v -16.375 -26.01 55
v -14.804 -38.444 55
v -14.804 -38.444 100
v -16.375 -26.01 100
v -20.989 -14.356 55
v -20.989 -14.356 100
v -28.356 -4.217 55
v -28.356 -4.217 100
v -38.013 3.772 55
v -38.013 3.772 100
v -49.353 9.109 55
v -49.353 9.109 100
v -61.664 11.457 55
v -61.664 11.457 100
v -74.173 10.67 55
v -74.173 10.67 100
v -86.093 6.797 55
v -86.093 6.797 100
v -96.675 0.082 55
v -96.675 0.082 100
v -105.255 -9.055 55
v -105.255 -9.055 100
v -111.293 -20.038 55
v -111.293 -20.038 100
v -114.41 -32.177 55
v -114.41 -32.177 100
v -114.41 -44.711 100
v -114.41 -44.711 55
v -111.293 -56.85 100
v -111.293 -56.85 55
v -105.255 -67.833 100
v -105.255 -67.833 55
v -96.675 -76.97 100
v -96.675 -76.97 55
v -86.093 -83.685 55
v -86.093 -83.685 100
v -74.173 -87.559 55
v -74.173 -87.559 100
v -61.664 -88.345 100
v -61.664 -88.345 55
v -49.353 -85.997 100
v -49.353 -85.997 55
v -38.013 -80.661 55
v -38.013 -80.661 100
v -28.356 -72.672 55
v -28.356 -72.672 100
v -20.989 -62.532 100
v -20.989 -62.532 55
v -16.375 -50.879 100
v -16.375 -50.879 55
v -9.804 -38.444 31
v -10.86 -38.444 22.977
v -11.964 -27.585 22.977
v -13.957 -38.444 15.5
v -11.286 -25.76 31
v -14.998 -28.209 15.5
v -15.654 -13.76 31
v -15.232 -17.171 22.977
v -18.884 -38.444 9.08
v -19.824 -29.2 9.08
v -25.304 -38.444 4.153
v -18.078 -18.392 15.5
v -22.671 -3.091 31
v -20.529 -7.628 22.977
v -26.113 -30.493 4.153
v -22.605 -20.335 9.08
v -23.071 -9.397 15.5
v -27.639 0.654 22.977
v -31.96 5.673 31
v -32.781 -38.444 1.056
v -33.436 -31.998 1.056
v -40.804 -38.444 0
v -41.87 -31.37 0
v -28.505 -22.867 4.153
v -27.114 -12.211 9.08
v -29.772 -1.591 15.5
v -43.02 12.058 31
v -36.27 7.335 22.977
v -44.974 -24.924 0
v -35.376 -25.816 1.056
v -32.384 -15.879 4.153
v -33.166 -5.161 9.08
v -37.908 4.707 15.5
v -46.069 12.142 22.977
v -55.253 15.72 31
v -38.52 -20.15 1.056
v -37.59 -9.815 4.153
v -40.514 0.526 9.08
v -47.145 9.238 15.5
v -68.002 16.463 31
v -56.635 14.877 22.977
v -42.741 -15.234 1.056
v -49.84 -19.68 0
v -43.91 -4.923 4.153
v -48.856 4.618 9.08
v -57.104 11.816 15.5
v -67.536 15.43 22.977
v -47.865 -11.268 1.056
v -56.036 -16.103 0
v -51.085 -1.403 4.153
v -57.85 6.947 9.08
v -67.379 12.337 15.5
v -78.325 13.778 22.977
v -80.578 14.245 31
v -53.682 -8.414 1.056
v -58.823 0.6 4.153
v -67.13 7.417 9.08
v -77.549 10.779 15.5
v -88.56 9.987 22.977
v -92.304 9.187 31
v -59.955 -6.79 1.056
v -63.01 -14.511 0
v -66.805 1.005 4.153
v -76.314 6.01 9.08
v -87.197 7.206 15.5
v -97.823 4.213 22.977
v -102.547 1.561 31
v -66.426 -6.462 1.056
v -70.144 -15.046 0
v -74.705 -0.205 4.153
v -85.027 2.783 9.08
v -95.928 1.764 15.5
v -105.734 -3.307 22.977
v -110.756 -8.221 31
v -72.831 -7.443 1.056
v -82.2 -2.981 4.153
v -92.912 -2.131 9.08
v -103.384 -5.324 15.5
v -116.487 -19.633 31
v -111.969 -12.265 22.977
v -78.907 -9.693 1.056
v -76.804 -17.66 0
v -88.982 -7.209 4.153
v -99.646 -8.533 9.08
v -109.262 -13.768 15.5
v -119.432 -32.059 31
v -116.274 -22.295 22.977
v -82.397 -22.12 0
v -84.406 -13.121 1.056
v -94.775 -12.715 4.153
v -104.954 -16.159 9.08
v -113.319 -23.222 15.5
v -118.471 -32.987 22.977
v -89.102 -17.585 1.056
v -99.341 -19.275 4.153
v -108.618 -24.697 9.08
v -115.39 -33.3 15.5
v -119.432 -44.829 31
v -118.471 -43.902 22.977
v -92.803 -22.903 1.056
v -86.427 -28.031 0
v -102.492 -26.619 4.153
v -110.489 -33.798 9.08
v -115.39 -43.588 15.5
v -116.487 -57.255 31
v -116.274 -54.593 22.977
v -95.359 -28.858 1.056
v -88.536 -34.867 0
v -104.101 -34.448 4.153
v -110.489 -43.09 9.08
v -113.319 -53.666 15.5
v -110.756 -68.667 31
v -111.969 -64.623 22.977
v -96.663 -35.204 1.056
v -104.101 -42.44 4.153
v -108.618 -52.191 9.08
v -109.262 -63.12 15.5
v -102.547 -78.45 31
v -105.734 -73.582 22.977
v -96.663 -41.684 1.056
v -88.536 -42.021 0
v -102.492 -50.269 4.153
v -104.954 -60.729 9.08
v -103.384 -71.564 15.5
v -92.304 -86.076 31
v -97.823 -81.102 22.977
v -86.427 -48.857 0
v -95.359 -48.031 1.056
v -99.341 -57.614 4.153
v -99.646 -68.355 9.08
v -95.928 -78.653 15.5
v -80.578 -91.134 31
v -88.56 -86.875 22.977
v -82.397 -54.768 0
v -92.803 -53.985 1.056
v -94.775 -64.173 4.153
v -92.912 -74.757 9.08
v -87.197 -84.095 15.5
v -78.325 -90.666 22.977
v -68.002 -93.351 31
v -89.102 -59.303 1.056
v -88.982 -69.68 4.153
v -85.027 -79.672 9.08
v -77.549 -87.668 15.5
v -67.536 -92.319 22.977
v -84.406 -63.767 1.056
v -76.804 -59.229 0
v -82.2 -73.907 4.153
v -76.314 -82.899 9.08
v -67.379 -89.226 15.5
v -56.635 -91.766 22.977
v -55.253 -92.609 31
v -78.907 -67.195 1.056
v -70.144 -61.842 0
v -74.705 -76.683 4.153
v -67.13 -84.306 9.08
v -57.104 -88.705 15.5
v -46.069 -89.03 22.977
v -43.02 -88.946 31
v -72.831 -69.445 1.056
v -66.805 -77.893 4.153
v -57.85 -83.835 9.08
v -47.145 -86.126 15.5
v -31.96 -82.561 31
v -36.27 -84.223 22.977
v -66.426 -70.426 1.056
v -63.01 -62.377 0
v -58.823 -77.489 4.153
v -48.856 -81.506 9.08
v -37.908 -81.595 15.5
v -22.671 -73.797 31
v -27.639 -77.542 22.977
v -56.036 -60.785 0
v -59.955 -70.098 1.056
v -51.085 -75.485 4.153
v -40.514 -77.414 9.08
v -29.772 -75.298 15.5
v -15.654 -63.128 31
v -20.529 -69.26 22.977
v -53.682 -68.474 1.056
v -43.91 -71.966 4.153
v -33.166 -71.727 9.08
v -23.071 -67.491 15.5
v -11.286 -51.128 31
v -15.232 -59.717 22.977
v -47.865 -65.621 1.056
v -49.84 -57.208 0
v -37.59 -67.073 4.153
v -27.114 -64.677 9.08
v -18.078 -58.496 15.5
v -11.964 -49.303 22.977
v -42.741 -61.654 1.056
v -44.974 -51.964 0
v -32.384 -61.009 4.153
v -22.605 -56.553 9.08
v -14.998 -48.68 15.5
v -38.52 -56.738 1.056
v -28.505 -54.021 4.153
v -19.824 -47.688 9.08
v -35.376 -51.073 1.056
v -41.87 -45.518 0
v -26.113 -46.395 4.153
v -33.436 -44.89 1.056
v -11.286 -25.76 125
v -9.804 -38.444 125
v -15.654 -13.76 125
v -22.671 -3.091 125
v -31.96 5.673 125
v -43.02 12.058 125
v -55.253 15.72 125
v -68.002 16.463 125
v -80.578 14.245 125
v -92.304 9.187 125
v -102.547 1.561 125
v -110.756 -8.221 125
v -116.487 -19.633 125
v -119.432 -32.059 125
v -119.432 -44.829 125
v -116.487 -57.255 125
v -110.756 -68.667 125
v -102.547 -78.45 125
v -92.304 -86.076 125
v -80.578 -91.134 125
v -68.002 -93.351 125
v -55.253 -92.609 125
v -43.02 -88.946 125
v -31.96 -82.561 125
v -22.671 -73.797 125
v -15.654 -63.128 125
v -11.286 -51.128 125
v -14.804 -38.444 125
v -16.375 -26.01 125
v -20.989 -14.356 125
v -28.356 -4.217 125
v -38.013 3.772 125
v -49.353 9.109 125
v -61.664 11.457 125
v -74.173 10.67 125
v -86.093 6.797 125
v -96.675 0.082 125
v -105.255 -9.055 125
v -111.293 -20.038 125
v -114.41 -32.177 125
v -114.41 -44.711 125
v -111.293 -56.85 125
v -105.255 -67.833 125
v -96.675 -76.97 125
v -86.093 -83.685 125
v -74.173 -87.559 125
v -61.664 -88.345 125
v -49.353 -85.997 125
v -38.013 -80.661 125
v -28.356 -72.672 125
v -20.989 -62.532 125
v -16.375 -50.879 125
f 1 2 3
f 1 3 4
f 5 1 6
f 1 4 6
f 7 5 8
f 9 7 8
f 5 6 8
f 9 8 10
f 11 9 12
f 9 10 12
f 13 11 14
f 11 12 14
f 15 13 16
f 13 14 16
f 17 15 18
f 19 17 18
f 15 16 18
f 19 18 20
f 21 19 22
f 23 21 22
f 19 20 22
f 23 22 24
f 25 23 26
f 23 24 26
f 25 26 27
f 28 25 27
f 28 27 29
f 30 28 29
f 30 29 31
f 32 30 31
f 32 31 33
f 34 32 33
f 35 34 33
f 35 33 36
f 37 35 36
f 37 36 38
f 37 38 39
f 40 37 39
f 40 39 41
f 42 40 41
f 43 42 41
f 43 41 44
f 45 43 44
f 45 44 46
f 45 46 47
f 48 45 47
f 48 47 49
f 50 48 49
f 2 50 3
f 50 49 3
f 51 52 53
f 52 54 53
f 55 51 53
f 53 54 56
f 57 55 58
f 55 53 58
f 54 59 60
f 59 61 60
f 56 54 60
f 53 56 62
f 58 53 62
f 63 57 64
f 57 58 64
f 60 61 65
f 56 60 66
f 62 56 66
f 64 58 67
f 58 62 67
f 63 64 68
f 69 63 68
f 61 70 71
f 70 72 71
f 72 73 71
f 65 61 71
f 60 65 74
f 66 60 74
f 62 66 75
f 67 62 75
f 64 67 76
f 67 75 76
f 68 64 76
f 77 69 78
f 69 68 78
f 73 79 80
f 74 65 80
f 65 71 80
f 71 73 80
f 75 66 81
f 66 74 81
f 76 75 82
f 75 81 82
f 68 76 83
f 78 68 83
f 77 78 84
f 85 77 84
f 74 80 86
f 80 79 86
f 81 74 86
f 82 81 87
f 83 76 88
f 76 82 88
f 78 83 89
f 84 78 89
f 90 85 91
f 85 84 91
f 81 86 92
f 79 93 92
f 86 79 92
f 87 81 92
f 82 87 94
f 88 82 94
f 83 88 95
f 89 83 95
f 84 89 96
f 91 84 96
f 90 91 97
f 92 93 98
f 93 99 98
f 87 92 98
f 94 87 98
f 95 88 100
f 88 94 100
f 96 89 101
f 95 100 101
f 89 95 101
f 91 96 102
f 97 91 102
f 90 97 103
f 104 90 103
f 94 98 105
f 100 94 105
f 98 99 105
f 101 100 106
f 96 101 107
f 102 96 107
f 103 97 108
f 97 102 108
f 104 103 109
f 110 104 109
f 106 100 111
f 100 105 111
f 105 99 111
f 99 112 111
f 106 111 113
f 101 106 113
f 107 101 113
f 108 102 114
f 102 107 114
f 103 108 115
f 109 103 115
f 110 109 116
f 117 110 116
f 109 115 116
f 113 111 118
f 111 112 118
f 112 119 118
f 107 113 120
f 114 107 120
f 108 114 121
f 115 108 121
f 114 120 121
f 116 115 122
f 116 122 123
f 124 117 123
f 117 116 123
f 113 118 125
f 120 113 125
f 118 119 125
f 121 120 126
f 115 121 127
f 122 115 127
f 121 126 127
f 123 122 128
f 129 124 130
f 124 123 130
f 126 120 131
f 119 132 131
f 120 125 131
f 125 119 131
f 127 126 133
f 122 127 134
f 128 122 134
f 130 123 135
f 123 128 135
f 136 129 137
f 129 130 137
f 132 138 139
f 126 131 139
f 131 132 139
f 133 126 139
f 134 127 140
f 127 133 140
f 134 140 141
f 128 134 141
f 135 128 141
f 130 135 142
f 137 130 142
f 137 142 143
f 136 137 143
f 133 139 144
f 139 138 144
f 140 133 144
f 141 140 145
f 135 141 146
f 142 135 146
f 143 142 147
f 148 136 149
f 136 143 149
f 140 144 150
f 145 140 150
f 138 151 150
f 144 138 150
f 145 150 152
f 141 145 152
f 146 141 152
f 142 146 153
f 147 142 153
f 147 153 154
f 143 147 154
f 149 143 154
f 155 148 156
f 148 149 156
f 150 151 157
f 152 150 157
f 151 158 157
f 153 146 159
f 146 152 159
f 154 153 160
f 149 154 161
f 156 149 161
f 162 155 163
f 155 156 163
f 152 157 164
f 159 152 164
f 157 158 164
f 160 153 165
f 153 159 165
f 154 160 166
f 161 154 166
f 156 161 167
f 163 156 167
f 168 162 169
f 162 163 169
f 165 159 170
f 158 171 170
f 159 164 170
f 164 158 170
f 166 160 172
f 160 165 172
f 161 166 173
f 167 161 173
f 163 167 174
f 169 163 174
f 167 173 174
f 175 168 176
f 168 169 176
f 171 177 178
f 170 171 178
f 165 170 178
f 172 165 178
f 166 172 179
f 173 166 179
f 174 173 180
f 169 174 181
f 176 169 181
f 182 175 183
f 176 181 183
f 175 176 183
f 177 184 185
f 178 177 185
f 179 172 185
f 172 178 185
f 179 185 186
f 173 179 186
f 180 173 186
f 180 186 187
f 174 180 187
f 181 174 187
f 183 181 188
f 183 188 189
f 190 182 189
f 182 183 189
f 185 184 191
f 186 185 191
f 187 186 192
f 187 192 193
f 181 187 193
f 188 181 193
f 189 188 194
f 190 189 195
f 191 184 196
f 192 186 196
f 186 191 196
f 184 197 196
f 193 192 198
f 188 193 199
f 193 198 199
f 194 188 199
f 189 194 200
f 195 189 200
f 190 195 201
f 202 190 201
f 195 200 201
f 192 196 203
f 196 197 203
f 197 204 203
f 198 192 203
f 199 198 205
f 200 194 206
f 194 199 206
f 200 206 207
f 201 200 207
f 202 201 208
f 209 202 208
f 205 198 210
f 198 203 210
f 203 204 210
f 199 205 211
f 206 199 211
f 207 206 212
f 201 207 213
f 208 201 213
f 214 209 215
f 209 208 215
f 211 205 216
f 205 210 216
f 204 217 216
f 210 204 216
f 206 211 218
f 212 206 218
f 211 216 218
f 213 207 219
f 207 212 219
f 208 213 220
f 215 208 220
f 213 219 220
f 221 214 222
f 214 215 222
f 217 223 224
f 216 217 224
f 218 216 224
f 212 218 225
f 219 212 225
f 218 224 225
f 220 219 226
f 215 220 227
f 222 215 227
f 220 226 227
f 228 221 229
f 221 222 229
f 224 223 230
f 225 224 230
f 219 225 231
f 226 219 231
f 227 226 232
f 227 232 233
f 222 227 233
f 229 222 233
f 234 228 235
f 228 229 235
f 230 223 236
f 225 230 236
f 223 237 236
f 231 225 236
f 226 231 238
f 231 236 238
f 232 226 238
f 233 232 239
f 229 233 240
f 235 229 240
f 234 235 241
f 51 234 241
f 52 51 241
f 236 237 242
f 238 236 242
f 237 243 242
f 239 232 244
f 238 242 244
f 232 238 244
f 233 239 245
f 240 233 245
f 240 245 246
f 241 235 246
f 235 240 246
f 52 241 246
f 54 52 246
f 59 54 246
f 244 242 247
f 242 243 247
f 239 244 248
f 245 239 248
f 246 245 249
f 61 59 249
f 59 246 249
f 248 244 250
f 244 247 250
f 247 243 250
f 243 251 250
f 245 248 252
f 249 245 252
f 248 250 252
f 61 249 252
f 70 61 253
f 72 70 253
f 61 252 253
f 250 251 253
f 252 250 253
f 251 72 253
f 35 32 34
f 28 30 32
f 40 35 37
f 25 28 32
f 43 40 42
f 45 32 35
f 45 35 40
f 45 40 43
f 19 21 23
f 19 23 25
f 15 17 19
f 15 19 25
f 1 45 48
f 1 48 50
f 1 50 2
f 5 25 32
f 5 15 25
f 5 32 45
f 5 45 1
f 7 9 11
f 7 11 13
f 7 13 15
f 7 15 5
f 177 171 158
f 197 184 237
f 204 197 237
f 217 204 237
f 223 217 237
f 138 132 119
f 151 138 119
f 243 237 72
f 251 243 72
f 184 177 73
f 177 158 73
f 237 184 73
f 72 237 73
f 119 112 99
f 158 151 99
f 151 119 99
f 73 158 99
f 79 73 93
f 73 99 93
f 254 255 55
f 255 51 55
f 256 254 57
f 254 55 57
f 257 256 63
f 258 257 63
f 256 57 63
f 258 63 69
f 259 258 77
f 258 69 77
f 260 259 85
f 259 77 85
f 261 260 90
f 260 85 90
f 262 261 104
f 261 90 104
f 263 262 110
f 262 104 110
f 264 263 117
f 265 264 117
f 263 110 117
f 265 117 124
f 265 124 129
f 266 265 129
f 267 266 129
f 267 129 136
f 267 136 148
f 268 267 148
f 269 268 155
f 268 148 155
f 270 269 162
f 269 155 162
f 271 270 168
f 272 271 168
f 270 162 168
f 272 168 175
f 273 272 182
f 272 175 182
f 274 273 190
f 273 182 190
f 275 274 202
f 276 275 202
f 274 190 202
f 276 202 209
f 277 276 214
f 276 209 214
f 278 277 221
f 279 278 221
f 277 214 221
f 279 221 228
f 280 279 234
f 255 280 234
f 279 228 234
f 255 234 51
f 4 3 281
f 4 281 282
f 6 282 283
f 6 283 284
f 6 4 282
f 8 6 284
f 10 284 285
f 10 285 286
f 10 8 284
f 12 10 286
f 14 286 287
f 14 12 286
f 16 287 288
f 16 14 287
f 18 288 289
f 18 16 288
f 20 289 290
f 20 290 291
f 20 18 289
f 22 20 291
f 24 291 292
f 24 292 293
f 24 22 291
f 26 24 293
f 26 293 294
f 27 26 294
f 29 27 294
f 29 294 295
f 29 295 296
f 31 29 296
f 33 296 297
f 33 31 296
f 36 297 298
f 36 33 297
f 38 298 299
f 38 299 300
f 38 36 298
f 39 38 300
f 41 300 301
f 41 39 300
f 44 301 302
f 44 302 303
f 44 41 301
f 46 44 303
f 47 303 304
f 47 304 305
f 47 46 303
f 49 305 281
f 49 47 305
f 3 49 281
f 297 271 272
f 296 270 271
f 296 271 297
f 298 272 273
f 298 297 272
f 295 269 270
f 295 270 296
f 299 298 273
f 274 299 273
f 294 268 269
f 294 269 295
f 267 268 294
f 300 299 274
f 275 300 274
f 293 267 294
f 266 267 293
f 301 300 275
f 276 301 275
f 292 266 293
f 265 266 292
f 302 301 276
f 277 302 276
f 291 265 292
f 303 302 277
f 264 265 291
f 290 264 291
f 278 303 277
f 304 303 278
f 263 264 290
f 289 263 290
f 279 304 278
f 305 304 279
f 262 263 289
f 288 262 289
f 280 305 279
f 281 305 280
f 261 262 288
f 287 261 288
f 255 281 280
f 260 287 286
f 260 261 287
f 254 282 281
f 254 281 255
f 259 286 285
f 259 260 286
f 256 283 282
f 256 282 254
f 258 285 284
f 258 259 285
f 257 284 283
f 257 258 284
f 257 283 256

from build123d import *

# Parameters (mm, degrees)
F0_R     = 55
F1_DEPTH = 100
F2_R     = 31
F3_R     = 50
F4_DEPTH = 70
F5_DEPTH = 25


with BuildPart() as f1:
    # F0 (on Top) → F1 (new body)
    with BuildSketch(Plane.XY):
        with Locations((-64.8039355874, -38.4441465139)):
            Circle(F0_R)
    extrude(amount=F1_DEPTH)

    # F2
    f2_edges = [f1.edges().sort_by_distance(p)[0] for p in [
        (-119.803936, -38.444147, 0),
    ]]
    fillet(f2_edges, radius=F2_R)

    # F3 (on face) → F4 (cut)
    with BuildSketch(Plane.XY.offset(100)):
        with Locations((-64.8039355874, -38.4441465139)):
            Circle(F3_R)
    extrude(amount=-F4_DEPTH, mode=Mode.SUBTRACT)

    # F5 (add): faces of the model
    f5_faces = [f1.faces().sort_by_distance(p)[0] for p in [
        (-118.2483006688, -38.4441465139, 100),
        (-64.8039355874, -38.4441465139, 30),
    ]]
    extrude(f5_faces, amount=F5_DEPTH)


solid = f1.part
